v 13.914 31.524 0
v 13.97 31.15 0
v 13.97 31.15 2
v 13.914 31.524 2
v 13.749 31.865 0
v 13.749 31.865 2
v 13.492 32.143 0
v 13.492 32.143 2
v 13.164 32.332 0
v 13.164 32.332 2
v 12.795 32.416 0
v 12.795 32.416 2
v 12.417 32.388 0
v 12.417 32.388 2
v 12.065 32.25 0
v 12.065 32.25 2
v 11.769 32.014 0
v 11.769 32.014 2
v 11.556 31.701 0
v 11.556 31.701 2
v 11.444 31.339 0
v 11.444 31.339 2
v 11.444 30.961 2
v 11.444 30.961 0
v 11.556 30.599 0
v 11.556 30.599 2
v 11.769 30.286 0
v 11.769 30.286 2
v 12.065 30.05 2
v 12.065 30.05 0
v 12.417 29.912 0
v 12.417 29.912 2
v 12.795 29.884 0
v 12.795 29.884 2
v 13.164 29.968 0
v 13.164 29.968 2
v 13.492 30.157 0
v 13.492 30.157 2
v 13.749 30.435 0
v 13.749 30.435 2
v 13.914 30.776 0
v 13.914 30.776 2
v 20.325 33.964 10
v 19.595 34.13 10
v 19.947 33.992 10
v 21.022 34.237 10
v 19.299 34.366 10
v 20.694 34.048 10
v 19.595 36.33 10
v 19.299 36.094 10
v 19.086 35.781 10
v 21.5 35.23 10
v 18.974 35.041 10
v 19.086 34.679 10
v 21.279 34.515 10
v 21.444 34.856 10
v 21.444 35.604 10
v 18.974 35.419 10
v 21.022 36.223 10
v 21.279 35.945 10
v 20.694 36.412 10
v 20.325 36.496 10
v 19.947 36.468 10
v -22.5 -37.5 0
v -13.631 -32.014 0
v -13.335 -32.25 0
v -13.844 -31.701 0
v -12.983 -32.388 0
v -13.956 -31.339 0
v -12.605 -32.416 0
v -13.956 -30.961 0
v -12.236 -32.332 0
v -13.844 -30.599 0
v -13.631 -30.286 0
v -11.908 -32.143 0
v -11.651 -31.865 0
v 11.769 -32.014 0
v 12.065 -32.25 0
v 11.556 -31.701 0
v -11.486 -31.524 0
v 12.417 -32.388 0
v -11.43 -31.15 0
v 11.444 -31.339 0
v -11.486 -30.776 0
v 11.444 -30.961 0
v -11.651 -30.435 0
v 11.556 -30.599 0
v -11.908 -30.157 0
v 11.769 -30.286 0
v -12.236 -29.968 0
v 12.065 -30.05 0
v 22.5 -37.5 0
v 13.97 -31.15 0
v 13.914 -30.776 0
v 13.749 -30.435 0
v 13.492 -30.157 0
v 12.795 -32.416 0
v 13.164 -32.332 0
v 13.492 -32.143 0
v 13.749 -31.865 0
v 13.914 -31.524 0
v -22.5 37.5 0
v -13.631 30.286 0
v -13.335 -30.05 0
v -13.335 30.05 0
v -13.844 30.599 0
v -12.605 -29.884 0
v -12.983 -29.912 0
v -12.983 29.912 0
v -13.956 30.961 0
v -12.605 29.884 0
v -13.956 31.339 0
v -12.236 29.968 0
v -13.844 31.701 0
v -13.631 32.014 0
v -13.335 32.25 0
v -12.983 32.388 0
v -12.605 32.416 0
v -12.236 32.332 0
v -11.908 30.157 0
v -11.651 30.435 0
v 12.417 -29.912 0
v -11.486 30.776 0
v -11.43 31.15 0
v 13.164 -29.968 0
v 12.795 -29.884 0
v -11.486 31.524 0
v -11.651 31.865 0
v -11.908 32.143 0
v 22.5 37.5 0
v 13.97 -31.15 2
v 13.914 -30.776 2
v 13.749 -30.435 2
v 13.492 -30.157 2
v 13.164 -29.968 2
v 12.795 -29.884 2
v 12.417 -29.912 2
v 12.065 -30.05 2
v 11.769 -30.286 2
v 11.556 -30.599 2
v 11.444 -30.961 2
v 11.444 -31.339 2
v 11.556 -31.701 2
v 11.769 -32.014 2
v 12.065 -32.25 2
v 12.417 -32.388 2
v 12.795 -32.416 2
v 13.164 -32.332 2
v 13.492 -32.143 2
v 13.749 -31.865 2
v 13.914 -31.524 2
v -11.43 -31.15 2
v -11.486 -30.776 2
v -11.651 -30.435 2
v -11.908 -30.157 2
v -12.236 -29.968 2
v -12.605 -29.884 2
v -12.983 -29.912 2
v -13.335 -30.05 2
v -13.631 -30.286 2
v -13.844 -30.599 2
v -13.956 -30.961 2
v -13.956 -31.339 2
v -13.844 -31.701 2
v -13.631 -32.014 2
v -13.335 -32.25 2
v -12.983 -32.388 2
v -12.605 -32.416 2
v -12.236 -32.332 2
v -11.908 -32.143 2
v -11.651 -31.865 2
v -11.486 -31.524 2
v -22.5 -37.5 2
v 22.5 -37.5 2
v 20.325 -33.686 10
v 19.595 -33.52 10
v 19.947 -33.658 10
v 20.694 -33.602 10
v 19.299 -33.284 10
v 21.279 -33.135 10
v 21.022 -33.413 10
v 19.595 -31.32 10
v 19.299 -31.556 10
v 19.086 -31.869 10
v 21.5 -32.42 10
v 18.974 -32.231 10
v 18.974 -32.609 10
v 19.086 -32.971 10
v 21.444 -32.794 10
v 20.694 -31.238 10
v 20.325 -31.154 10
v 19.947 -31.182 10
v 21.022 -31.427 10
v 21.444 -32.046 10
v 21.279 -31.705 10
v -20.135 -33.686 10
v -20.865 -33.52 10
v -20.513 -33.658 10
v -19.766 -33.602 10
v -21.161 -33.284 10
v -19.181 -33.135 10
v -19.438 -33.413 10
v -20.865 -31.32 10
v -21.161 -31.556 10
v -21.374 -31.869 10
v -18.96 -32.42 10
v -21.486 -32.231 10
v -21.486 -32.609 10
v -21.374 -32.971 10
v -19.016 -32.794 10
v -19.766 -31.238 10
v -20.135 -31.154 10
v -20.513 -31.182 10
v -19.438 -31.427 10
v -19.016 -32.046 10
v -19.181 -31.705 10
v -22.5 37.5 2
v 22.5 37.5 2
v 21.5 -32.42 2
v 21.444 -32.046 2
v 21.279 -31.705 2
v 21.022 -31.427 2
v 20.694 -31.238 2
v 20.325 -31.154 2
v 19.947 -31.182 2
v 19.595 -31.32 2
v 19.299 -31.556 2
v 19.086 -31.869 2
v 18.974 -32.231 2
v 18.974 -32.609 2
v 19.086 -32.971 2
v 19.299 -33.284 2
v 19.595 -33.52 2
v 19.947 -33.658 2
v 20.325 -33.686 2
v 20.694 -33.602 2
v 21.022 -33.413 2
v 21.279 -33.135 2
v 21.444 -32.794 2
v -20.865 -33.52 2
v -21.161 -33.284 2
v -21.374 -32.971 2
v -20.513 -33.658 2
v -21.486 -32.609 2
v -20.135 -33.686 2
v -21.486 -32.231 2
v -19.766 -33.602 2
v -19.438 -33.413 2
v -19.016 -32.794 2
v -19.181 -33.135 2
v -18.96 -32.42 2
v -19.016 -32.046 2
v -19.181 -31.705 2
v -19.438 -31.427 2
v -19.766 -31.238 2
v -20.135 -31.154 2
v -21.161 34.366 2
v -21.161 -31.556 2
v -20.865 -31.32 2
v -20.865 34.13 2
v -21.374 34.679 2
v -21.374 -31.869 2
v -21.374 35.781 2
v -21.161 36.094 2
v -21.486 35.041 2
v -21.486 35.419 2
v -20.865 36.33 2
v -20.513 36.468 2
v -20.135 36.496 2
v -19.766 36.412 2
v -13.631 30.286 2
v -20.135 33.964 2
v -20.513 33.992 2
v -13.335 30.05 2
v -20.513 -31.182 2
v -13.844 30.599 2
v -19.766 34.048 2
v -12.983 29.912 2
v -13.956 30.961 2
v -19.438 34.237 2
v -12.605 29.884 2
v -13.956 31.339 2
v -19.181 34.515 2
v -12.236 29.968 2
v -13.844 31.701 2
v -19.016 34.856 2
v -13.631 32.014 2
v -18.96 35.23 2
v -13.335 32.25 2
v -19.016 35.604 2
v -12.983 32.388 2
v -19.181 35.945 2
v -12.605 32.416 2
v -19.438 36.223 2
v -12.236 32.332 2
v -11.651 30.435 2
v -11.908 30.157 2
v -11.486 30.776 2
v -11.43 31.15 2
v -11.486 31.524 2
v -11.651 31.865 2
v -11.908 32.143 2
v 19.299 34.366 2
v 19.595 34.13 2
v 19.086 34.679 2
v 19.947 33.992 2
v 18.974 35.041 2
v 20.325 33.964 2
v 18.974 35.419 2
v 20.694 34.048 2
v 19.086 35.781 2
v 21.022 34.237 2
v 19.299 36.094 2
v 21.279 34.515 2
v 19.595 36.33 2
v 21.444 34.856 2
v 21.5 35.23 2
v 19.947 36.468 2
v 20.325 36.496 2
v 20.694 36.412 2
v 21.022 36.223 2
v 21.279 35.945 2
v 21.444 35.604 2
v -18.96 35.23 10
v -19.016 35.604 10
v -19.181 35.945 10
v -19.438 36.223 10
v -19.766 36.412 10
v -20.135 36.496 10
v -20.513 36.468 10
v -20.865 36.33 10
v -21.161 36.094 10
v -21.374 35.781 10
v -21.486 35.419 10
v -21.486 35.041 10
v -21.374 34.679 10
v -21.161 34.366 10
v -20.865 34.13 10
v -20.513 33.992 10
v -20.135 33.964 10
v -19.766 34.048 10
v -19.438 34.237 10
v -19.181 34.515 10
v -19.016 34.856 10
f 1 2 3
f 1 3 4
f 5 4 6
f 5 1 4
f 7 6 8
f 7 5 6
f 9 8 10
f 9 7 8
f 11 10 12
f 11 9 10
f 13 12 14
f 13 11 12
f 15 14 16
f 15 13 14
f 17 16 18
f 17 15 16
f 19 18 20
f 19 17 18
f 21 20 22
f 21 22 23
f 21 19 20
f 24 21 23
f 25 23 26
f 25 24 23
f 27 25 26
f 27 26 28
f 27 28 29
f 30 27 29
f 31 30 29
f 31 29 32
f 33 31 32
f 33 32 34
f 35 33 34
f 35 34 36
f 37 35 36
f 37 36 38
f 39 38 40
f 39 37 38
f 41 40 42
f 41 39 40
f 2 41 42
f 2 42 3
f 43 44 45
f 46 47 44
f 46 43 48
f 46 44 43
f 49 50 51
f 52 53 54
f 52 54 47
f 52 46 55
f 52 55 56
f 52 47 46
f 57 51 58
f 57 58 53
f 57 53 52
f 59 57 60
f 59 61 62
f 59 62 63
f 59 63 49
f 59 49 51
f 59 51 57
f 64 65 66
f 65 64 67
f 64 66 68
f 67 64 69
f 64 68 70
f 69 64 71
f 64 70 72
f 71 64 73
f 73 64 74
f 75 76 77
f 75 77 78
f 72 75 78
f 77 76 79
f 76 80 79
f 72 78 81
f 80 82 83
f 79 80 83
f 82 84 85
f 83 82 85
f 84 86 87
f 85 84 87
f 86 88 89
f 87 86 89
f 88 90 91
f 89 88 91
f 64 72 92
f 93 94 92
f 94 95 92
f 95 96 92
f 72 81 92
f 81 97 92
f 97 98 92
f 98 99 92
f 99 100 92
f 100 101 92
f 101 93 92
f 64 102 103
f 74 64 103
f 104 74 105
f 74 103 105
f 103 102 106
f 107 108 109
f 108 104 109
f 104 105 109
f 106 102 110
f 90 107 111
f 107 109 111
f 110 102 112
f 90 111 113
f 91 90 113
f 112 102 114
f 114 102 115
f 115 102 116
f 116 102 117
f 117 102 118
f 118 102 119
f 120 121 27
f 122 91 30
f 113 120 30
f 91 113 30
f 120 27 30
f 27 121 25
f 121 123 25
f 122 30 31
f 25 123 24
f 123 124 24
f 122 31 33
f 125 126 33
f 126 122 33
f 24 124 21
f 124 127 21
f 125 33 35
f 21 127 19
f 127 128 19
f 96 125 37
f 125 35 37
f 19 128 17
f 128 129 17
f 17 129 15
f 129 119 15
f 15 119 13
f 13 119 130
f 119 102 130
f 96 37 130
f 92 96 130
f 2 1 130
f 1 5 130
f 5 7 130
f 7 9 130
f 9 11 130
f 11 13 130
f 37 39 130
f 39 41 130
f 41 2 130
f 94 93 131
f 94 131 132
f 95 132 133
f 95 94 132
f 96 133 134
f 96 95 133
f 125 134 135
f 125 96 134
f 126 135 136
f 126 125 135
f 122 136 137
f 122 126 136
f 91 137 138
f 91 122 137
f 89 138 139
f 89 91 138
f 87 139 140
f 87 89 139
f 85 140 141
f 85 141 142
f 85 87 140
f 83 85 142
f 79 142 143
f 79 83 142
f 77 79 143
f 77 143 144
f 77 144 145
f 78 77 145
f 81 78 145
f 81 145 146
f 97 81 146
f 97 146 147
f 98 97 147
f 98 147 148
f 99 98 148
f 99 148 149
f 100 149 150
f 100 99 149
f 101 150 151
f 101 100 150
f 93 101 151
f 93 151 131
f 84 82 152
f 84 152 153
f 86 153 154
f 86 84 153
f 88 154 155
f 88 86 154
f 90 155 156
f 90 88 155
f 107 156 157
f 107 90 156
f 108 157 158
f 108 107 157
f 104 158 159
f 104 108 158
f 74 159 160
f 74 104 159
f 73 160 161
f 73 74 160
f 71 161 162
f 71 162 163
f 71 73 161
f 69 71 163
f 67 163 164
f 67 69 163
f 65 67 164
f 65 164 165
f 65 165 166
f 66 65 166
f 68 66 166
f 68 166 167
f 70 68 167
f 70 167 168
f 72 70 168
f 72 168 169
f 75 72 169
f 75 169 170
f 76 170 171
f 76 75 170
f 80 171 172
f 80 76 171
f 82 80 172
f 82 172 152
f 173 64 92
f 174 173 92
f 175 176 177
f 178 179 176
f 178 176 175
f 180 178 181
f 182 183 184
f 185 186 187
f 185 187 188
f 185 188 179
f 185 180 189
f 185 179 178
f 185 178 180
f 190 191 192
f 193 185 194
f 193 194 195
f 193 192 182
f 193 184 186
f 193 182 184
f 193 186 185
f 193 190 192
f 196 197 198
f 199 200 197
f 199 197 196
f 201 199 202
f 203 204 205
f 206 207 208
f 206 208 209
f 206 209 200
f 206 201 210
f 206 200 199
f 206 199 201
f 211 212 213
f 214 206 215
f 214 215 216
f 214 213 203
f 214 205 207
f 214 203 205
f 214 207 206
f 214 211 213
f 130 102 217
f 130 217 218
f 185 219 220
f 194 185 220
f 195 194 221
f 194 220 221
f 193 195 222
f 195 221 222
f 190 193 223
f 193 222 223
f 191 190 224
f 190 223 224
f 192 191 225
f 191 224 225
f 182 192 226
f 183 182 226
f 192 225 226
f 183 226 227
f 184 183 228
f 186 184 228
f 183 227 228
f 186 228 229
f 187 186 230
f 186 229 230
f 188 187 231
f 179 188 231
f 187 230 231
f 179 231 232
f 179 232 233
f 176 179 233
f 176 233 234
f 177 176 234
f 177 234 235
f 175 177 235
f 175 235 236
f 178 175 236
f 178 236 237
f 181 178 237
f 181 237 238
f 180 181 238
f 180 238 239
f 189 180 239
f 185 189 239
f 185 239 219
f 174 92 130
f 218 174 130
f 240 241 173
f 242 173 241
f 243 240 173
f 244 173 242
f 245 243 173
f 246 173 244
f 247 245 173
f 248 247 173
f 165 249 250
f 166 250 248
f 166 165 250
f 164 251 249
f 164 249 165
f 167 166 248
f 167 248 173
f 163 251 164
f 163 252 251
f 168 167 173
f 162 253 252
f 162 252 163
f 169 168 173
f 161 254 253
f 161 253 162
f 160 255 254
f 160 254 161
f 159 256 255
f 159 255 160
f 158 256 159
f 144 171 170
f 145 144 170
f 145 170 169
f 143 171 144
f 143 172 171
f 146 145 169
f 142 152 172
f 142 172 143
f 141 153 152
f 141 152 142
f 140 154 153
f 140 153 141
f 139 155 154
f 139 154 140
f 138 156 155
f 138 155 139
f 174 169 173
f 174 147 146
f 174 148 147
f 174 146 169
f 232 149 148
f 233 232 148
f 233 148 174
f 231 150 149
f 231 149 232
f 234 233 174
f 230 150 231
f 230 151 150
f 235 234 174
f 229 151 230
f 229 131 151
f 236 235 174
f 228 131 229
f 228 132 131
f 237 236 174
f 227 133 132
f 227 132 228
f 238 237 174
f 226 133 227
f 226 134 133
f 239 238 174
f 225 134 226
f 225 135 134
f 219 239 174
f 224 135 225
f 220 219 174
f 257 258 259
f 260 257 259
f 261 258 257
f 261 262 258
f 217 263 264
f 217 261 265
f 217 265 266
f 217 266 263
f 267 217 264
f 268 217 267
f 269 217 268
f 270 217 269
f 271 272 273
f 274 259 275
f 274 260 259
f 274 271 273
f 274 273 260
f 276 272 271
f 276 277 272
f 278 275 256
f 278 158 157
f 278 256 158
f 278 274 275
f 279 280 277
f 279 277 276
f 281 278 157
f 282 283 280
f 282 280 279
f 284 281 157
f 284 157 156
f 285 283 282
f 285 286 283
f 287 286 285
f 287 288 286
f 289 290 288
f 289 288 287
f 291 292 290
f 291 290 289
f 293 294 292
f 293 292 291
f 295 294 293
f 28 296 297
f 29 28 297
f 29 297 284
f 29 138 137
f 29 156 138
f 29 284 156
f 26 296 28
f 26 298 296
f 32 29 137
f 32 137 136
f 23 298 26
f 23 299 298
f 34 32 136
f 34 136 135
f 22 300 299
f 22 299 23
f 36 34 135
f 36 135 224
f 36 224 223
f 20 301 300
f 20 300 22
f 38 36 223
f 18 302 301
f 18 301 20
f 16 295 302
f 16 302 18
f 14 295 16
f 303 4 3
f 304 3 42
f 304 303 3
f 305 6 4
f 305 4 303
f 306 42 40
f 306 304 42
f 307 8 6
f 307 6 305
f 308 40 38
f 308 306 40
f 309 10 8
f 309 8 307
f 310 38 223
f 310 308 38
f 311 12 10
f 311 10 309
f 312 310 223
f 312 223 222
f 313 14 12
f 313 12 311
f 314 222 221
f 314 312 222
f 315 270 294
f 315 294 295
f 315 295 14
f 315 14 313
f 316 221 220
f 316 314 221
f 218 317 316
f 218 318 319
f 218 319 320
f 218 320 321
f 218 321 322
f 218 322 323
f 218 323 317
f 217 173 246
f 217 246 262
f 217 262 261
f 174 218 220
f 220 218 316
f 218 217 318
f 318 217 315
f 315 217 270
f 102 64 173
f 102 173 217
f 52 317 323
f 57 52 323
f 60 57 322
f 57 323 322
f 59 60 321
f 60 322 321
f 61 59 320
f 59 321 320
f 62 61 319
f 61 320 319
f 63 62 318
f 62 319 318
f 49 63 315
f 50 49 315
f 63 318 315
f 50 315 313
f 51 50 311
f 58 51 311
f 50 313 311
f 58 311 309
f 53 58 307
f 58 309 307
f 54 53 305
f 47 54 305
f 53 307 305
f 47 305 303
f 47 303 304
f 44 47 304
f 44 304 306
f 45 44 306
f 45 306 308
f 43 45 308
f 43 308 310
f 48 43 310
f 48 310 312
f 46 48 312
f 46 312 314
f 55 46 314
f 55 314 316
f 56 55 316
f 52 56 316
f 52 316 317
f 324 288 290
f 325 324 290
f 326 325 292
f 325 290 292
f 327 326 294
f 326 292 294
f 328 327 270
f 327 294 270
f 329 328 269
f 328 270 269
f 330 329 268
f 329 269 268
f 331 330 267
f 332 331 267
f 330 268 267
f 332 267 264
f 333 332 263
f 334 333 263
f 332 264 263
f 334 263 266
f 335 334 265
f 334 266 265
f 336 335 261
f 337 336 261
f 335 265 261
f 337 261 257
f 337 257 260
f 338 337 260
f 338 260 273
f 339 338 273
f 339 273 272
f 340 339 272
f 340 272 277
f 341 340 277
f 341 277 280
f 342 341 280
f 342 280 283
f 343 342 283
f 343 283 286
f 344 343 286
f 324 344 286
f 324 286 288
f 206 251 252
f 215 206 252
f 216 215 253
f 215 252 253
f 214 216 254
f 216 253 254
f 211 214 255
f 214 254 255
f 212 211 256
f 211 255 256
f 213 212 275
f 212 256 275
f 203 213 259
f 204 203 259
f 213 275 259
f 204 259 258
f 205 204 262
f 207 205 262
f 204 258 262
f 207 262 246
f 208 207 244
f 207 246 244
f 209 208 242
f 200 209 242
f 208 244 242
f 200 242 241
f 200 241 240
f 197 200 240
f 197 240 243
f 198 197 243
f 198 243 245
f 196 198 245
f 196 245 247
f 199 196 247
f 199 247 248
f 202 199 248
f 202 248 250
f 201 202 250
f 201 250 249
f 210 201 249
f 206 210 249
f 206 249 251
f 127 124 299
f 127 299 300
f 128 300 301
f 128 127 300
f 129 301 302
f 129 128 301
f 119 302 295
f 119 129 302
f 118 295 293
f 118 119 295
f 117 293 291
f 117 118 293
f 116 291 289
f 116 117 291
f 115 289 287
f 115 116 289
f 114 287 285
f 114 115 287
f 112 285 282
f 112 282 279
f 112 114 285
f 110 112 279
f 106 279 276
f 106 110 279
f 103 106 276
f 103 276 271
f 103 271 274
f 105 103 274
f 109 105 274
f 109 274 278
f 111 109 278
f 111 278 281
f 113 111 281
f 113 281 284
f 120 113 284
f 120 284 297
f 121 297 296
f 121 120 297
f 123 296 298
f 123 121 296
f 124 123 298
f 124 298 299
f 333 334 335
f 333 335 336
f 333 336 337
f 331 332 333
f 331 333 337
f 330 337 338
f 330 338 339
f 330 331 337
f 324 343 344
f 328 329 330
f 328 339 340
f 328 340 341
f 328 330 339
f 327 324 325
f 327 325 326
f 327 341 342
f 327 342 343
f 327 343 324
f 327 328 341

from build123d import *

# Parameters (mm, degrees)
F0_W     = 45
F0_H     = 75
F0_R     = 1.27
F1_DEPTH = 2
F2_DEPTH = 10


with BuildPart() as f1:
    # F0 (on Top) → F1 (new body)
    with BuildSketch(Plane.XY):
        Rectangle(F0_W, F0_H)
        with Locations((-20.230002, -32.42)):
            Circle(F0_R, mode=Mode.SUBTRACT)
        with Locations((-12.7, -31.15)):
            Circle(F0_R, mode=Mode.SUBTRACT)
        with Locations((12.7, -31.15)):
            Circle(F0_R, mode=Mode.SUBTRACT)
        with Locations((20.230002, -32.42)):
            Circle(F0_R, mode=Mode.SUBTRACT)
        with Locations((-20.230002, 35.23)):
            Circle(F0_R, mode=Mode.SUBTRACT)
        with Locations((-12.7, 31.15)):
            Circle(F0_R, mode=Mode.SUBTRACT)
        with Locations((12.7, 31.15)):
            Circle(F0_R, mode=Mode.SUBTRACT)
        with Locations((20.23, 35.230002)):
            Circle(F0_R, mode=Mode.SUBTRACT)
        with Locations((-20.230002, -32.42)):
            Circle(F0_R)
        with Locations((20.230002, -32.42)):
            Circle(F0_R)
        with Locations((20.23, 35.230002)):
            Circle(F0_R)
        with Locations((-20.230002, 35.23)):
            Circle(F0_R)
    extrude(amount=F1_DEPTH)

    # F0 (on Top) → F2 (join)
    with BuildSketch(Plane.XY):
        with Locations((-20.230002, 35.23)):
            Circle(F0_R)
        with Locations((20.230002, -32.42)):
            Circle(F0_R)
        with Locations((-20.230002, -32.42)):
            Circle(F0_R)
        with Locations((20.23, 35.230002)):
            Circle(F0_R)
    extrude(amount=F2_DEPTH)


solid = f1.part
